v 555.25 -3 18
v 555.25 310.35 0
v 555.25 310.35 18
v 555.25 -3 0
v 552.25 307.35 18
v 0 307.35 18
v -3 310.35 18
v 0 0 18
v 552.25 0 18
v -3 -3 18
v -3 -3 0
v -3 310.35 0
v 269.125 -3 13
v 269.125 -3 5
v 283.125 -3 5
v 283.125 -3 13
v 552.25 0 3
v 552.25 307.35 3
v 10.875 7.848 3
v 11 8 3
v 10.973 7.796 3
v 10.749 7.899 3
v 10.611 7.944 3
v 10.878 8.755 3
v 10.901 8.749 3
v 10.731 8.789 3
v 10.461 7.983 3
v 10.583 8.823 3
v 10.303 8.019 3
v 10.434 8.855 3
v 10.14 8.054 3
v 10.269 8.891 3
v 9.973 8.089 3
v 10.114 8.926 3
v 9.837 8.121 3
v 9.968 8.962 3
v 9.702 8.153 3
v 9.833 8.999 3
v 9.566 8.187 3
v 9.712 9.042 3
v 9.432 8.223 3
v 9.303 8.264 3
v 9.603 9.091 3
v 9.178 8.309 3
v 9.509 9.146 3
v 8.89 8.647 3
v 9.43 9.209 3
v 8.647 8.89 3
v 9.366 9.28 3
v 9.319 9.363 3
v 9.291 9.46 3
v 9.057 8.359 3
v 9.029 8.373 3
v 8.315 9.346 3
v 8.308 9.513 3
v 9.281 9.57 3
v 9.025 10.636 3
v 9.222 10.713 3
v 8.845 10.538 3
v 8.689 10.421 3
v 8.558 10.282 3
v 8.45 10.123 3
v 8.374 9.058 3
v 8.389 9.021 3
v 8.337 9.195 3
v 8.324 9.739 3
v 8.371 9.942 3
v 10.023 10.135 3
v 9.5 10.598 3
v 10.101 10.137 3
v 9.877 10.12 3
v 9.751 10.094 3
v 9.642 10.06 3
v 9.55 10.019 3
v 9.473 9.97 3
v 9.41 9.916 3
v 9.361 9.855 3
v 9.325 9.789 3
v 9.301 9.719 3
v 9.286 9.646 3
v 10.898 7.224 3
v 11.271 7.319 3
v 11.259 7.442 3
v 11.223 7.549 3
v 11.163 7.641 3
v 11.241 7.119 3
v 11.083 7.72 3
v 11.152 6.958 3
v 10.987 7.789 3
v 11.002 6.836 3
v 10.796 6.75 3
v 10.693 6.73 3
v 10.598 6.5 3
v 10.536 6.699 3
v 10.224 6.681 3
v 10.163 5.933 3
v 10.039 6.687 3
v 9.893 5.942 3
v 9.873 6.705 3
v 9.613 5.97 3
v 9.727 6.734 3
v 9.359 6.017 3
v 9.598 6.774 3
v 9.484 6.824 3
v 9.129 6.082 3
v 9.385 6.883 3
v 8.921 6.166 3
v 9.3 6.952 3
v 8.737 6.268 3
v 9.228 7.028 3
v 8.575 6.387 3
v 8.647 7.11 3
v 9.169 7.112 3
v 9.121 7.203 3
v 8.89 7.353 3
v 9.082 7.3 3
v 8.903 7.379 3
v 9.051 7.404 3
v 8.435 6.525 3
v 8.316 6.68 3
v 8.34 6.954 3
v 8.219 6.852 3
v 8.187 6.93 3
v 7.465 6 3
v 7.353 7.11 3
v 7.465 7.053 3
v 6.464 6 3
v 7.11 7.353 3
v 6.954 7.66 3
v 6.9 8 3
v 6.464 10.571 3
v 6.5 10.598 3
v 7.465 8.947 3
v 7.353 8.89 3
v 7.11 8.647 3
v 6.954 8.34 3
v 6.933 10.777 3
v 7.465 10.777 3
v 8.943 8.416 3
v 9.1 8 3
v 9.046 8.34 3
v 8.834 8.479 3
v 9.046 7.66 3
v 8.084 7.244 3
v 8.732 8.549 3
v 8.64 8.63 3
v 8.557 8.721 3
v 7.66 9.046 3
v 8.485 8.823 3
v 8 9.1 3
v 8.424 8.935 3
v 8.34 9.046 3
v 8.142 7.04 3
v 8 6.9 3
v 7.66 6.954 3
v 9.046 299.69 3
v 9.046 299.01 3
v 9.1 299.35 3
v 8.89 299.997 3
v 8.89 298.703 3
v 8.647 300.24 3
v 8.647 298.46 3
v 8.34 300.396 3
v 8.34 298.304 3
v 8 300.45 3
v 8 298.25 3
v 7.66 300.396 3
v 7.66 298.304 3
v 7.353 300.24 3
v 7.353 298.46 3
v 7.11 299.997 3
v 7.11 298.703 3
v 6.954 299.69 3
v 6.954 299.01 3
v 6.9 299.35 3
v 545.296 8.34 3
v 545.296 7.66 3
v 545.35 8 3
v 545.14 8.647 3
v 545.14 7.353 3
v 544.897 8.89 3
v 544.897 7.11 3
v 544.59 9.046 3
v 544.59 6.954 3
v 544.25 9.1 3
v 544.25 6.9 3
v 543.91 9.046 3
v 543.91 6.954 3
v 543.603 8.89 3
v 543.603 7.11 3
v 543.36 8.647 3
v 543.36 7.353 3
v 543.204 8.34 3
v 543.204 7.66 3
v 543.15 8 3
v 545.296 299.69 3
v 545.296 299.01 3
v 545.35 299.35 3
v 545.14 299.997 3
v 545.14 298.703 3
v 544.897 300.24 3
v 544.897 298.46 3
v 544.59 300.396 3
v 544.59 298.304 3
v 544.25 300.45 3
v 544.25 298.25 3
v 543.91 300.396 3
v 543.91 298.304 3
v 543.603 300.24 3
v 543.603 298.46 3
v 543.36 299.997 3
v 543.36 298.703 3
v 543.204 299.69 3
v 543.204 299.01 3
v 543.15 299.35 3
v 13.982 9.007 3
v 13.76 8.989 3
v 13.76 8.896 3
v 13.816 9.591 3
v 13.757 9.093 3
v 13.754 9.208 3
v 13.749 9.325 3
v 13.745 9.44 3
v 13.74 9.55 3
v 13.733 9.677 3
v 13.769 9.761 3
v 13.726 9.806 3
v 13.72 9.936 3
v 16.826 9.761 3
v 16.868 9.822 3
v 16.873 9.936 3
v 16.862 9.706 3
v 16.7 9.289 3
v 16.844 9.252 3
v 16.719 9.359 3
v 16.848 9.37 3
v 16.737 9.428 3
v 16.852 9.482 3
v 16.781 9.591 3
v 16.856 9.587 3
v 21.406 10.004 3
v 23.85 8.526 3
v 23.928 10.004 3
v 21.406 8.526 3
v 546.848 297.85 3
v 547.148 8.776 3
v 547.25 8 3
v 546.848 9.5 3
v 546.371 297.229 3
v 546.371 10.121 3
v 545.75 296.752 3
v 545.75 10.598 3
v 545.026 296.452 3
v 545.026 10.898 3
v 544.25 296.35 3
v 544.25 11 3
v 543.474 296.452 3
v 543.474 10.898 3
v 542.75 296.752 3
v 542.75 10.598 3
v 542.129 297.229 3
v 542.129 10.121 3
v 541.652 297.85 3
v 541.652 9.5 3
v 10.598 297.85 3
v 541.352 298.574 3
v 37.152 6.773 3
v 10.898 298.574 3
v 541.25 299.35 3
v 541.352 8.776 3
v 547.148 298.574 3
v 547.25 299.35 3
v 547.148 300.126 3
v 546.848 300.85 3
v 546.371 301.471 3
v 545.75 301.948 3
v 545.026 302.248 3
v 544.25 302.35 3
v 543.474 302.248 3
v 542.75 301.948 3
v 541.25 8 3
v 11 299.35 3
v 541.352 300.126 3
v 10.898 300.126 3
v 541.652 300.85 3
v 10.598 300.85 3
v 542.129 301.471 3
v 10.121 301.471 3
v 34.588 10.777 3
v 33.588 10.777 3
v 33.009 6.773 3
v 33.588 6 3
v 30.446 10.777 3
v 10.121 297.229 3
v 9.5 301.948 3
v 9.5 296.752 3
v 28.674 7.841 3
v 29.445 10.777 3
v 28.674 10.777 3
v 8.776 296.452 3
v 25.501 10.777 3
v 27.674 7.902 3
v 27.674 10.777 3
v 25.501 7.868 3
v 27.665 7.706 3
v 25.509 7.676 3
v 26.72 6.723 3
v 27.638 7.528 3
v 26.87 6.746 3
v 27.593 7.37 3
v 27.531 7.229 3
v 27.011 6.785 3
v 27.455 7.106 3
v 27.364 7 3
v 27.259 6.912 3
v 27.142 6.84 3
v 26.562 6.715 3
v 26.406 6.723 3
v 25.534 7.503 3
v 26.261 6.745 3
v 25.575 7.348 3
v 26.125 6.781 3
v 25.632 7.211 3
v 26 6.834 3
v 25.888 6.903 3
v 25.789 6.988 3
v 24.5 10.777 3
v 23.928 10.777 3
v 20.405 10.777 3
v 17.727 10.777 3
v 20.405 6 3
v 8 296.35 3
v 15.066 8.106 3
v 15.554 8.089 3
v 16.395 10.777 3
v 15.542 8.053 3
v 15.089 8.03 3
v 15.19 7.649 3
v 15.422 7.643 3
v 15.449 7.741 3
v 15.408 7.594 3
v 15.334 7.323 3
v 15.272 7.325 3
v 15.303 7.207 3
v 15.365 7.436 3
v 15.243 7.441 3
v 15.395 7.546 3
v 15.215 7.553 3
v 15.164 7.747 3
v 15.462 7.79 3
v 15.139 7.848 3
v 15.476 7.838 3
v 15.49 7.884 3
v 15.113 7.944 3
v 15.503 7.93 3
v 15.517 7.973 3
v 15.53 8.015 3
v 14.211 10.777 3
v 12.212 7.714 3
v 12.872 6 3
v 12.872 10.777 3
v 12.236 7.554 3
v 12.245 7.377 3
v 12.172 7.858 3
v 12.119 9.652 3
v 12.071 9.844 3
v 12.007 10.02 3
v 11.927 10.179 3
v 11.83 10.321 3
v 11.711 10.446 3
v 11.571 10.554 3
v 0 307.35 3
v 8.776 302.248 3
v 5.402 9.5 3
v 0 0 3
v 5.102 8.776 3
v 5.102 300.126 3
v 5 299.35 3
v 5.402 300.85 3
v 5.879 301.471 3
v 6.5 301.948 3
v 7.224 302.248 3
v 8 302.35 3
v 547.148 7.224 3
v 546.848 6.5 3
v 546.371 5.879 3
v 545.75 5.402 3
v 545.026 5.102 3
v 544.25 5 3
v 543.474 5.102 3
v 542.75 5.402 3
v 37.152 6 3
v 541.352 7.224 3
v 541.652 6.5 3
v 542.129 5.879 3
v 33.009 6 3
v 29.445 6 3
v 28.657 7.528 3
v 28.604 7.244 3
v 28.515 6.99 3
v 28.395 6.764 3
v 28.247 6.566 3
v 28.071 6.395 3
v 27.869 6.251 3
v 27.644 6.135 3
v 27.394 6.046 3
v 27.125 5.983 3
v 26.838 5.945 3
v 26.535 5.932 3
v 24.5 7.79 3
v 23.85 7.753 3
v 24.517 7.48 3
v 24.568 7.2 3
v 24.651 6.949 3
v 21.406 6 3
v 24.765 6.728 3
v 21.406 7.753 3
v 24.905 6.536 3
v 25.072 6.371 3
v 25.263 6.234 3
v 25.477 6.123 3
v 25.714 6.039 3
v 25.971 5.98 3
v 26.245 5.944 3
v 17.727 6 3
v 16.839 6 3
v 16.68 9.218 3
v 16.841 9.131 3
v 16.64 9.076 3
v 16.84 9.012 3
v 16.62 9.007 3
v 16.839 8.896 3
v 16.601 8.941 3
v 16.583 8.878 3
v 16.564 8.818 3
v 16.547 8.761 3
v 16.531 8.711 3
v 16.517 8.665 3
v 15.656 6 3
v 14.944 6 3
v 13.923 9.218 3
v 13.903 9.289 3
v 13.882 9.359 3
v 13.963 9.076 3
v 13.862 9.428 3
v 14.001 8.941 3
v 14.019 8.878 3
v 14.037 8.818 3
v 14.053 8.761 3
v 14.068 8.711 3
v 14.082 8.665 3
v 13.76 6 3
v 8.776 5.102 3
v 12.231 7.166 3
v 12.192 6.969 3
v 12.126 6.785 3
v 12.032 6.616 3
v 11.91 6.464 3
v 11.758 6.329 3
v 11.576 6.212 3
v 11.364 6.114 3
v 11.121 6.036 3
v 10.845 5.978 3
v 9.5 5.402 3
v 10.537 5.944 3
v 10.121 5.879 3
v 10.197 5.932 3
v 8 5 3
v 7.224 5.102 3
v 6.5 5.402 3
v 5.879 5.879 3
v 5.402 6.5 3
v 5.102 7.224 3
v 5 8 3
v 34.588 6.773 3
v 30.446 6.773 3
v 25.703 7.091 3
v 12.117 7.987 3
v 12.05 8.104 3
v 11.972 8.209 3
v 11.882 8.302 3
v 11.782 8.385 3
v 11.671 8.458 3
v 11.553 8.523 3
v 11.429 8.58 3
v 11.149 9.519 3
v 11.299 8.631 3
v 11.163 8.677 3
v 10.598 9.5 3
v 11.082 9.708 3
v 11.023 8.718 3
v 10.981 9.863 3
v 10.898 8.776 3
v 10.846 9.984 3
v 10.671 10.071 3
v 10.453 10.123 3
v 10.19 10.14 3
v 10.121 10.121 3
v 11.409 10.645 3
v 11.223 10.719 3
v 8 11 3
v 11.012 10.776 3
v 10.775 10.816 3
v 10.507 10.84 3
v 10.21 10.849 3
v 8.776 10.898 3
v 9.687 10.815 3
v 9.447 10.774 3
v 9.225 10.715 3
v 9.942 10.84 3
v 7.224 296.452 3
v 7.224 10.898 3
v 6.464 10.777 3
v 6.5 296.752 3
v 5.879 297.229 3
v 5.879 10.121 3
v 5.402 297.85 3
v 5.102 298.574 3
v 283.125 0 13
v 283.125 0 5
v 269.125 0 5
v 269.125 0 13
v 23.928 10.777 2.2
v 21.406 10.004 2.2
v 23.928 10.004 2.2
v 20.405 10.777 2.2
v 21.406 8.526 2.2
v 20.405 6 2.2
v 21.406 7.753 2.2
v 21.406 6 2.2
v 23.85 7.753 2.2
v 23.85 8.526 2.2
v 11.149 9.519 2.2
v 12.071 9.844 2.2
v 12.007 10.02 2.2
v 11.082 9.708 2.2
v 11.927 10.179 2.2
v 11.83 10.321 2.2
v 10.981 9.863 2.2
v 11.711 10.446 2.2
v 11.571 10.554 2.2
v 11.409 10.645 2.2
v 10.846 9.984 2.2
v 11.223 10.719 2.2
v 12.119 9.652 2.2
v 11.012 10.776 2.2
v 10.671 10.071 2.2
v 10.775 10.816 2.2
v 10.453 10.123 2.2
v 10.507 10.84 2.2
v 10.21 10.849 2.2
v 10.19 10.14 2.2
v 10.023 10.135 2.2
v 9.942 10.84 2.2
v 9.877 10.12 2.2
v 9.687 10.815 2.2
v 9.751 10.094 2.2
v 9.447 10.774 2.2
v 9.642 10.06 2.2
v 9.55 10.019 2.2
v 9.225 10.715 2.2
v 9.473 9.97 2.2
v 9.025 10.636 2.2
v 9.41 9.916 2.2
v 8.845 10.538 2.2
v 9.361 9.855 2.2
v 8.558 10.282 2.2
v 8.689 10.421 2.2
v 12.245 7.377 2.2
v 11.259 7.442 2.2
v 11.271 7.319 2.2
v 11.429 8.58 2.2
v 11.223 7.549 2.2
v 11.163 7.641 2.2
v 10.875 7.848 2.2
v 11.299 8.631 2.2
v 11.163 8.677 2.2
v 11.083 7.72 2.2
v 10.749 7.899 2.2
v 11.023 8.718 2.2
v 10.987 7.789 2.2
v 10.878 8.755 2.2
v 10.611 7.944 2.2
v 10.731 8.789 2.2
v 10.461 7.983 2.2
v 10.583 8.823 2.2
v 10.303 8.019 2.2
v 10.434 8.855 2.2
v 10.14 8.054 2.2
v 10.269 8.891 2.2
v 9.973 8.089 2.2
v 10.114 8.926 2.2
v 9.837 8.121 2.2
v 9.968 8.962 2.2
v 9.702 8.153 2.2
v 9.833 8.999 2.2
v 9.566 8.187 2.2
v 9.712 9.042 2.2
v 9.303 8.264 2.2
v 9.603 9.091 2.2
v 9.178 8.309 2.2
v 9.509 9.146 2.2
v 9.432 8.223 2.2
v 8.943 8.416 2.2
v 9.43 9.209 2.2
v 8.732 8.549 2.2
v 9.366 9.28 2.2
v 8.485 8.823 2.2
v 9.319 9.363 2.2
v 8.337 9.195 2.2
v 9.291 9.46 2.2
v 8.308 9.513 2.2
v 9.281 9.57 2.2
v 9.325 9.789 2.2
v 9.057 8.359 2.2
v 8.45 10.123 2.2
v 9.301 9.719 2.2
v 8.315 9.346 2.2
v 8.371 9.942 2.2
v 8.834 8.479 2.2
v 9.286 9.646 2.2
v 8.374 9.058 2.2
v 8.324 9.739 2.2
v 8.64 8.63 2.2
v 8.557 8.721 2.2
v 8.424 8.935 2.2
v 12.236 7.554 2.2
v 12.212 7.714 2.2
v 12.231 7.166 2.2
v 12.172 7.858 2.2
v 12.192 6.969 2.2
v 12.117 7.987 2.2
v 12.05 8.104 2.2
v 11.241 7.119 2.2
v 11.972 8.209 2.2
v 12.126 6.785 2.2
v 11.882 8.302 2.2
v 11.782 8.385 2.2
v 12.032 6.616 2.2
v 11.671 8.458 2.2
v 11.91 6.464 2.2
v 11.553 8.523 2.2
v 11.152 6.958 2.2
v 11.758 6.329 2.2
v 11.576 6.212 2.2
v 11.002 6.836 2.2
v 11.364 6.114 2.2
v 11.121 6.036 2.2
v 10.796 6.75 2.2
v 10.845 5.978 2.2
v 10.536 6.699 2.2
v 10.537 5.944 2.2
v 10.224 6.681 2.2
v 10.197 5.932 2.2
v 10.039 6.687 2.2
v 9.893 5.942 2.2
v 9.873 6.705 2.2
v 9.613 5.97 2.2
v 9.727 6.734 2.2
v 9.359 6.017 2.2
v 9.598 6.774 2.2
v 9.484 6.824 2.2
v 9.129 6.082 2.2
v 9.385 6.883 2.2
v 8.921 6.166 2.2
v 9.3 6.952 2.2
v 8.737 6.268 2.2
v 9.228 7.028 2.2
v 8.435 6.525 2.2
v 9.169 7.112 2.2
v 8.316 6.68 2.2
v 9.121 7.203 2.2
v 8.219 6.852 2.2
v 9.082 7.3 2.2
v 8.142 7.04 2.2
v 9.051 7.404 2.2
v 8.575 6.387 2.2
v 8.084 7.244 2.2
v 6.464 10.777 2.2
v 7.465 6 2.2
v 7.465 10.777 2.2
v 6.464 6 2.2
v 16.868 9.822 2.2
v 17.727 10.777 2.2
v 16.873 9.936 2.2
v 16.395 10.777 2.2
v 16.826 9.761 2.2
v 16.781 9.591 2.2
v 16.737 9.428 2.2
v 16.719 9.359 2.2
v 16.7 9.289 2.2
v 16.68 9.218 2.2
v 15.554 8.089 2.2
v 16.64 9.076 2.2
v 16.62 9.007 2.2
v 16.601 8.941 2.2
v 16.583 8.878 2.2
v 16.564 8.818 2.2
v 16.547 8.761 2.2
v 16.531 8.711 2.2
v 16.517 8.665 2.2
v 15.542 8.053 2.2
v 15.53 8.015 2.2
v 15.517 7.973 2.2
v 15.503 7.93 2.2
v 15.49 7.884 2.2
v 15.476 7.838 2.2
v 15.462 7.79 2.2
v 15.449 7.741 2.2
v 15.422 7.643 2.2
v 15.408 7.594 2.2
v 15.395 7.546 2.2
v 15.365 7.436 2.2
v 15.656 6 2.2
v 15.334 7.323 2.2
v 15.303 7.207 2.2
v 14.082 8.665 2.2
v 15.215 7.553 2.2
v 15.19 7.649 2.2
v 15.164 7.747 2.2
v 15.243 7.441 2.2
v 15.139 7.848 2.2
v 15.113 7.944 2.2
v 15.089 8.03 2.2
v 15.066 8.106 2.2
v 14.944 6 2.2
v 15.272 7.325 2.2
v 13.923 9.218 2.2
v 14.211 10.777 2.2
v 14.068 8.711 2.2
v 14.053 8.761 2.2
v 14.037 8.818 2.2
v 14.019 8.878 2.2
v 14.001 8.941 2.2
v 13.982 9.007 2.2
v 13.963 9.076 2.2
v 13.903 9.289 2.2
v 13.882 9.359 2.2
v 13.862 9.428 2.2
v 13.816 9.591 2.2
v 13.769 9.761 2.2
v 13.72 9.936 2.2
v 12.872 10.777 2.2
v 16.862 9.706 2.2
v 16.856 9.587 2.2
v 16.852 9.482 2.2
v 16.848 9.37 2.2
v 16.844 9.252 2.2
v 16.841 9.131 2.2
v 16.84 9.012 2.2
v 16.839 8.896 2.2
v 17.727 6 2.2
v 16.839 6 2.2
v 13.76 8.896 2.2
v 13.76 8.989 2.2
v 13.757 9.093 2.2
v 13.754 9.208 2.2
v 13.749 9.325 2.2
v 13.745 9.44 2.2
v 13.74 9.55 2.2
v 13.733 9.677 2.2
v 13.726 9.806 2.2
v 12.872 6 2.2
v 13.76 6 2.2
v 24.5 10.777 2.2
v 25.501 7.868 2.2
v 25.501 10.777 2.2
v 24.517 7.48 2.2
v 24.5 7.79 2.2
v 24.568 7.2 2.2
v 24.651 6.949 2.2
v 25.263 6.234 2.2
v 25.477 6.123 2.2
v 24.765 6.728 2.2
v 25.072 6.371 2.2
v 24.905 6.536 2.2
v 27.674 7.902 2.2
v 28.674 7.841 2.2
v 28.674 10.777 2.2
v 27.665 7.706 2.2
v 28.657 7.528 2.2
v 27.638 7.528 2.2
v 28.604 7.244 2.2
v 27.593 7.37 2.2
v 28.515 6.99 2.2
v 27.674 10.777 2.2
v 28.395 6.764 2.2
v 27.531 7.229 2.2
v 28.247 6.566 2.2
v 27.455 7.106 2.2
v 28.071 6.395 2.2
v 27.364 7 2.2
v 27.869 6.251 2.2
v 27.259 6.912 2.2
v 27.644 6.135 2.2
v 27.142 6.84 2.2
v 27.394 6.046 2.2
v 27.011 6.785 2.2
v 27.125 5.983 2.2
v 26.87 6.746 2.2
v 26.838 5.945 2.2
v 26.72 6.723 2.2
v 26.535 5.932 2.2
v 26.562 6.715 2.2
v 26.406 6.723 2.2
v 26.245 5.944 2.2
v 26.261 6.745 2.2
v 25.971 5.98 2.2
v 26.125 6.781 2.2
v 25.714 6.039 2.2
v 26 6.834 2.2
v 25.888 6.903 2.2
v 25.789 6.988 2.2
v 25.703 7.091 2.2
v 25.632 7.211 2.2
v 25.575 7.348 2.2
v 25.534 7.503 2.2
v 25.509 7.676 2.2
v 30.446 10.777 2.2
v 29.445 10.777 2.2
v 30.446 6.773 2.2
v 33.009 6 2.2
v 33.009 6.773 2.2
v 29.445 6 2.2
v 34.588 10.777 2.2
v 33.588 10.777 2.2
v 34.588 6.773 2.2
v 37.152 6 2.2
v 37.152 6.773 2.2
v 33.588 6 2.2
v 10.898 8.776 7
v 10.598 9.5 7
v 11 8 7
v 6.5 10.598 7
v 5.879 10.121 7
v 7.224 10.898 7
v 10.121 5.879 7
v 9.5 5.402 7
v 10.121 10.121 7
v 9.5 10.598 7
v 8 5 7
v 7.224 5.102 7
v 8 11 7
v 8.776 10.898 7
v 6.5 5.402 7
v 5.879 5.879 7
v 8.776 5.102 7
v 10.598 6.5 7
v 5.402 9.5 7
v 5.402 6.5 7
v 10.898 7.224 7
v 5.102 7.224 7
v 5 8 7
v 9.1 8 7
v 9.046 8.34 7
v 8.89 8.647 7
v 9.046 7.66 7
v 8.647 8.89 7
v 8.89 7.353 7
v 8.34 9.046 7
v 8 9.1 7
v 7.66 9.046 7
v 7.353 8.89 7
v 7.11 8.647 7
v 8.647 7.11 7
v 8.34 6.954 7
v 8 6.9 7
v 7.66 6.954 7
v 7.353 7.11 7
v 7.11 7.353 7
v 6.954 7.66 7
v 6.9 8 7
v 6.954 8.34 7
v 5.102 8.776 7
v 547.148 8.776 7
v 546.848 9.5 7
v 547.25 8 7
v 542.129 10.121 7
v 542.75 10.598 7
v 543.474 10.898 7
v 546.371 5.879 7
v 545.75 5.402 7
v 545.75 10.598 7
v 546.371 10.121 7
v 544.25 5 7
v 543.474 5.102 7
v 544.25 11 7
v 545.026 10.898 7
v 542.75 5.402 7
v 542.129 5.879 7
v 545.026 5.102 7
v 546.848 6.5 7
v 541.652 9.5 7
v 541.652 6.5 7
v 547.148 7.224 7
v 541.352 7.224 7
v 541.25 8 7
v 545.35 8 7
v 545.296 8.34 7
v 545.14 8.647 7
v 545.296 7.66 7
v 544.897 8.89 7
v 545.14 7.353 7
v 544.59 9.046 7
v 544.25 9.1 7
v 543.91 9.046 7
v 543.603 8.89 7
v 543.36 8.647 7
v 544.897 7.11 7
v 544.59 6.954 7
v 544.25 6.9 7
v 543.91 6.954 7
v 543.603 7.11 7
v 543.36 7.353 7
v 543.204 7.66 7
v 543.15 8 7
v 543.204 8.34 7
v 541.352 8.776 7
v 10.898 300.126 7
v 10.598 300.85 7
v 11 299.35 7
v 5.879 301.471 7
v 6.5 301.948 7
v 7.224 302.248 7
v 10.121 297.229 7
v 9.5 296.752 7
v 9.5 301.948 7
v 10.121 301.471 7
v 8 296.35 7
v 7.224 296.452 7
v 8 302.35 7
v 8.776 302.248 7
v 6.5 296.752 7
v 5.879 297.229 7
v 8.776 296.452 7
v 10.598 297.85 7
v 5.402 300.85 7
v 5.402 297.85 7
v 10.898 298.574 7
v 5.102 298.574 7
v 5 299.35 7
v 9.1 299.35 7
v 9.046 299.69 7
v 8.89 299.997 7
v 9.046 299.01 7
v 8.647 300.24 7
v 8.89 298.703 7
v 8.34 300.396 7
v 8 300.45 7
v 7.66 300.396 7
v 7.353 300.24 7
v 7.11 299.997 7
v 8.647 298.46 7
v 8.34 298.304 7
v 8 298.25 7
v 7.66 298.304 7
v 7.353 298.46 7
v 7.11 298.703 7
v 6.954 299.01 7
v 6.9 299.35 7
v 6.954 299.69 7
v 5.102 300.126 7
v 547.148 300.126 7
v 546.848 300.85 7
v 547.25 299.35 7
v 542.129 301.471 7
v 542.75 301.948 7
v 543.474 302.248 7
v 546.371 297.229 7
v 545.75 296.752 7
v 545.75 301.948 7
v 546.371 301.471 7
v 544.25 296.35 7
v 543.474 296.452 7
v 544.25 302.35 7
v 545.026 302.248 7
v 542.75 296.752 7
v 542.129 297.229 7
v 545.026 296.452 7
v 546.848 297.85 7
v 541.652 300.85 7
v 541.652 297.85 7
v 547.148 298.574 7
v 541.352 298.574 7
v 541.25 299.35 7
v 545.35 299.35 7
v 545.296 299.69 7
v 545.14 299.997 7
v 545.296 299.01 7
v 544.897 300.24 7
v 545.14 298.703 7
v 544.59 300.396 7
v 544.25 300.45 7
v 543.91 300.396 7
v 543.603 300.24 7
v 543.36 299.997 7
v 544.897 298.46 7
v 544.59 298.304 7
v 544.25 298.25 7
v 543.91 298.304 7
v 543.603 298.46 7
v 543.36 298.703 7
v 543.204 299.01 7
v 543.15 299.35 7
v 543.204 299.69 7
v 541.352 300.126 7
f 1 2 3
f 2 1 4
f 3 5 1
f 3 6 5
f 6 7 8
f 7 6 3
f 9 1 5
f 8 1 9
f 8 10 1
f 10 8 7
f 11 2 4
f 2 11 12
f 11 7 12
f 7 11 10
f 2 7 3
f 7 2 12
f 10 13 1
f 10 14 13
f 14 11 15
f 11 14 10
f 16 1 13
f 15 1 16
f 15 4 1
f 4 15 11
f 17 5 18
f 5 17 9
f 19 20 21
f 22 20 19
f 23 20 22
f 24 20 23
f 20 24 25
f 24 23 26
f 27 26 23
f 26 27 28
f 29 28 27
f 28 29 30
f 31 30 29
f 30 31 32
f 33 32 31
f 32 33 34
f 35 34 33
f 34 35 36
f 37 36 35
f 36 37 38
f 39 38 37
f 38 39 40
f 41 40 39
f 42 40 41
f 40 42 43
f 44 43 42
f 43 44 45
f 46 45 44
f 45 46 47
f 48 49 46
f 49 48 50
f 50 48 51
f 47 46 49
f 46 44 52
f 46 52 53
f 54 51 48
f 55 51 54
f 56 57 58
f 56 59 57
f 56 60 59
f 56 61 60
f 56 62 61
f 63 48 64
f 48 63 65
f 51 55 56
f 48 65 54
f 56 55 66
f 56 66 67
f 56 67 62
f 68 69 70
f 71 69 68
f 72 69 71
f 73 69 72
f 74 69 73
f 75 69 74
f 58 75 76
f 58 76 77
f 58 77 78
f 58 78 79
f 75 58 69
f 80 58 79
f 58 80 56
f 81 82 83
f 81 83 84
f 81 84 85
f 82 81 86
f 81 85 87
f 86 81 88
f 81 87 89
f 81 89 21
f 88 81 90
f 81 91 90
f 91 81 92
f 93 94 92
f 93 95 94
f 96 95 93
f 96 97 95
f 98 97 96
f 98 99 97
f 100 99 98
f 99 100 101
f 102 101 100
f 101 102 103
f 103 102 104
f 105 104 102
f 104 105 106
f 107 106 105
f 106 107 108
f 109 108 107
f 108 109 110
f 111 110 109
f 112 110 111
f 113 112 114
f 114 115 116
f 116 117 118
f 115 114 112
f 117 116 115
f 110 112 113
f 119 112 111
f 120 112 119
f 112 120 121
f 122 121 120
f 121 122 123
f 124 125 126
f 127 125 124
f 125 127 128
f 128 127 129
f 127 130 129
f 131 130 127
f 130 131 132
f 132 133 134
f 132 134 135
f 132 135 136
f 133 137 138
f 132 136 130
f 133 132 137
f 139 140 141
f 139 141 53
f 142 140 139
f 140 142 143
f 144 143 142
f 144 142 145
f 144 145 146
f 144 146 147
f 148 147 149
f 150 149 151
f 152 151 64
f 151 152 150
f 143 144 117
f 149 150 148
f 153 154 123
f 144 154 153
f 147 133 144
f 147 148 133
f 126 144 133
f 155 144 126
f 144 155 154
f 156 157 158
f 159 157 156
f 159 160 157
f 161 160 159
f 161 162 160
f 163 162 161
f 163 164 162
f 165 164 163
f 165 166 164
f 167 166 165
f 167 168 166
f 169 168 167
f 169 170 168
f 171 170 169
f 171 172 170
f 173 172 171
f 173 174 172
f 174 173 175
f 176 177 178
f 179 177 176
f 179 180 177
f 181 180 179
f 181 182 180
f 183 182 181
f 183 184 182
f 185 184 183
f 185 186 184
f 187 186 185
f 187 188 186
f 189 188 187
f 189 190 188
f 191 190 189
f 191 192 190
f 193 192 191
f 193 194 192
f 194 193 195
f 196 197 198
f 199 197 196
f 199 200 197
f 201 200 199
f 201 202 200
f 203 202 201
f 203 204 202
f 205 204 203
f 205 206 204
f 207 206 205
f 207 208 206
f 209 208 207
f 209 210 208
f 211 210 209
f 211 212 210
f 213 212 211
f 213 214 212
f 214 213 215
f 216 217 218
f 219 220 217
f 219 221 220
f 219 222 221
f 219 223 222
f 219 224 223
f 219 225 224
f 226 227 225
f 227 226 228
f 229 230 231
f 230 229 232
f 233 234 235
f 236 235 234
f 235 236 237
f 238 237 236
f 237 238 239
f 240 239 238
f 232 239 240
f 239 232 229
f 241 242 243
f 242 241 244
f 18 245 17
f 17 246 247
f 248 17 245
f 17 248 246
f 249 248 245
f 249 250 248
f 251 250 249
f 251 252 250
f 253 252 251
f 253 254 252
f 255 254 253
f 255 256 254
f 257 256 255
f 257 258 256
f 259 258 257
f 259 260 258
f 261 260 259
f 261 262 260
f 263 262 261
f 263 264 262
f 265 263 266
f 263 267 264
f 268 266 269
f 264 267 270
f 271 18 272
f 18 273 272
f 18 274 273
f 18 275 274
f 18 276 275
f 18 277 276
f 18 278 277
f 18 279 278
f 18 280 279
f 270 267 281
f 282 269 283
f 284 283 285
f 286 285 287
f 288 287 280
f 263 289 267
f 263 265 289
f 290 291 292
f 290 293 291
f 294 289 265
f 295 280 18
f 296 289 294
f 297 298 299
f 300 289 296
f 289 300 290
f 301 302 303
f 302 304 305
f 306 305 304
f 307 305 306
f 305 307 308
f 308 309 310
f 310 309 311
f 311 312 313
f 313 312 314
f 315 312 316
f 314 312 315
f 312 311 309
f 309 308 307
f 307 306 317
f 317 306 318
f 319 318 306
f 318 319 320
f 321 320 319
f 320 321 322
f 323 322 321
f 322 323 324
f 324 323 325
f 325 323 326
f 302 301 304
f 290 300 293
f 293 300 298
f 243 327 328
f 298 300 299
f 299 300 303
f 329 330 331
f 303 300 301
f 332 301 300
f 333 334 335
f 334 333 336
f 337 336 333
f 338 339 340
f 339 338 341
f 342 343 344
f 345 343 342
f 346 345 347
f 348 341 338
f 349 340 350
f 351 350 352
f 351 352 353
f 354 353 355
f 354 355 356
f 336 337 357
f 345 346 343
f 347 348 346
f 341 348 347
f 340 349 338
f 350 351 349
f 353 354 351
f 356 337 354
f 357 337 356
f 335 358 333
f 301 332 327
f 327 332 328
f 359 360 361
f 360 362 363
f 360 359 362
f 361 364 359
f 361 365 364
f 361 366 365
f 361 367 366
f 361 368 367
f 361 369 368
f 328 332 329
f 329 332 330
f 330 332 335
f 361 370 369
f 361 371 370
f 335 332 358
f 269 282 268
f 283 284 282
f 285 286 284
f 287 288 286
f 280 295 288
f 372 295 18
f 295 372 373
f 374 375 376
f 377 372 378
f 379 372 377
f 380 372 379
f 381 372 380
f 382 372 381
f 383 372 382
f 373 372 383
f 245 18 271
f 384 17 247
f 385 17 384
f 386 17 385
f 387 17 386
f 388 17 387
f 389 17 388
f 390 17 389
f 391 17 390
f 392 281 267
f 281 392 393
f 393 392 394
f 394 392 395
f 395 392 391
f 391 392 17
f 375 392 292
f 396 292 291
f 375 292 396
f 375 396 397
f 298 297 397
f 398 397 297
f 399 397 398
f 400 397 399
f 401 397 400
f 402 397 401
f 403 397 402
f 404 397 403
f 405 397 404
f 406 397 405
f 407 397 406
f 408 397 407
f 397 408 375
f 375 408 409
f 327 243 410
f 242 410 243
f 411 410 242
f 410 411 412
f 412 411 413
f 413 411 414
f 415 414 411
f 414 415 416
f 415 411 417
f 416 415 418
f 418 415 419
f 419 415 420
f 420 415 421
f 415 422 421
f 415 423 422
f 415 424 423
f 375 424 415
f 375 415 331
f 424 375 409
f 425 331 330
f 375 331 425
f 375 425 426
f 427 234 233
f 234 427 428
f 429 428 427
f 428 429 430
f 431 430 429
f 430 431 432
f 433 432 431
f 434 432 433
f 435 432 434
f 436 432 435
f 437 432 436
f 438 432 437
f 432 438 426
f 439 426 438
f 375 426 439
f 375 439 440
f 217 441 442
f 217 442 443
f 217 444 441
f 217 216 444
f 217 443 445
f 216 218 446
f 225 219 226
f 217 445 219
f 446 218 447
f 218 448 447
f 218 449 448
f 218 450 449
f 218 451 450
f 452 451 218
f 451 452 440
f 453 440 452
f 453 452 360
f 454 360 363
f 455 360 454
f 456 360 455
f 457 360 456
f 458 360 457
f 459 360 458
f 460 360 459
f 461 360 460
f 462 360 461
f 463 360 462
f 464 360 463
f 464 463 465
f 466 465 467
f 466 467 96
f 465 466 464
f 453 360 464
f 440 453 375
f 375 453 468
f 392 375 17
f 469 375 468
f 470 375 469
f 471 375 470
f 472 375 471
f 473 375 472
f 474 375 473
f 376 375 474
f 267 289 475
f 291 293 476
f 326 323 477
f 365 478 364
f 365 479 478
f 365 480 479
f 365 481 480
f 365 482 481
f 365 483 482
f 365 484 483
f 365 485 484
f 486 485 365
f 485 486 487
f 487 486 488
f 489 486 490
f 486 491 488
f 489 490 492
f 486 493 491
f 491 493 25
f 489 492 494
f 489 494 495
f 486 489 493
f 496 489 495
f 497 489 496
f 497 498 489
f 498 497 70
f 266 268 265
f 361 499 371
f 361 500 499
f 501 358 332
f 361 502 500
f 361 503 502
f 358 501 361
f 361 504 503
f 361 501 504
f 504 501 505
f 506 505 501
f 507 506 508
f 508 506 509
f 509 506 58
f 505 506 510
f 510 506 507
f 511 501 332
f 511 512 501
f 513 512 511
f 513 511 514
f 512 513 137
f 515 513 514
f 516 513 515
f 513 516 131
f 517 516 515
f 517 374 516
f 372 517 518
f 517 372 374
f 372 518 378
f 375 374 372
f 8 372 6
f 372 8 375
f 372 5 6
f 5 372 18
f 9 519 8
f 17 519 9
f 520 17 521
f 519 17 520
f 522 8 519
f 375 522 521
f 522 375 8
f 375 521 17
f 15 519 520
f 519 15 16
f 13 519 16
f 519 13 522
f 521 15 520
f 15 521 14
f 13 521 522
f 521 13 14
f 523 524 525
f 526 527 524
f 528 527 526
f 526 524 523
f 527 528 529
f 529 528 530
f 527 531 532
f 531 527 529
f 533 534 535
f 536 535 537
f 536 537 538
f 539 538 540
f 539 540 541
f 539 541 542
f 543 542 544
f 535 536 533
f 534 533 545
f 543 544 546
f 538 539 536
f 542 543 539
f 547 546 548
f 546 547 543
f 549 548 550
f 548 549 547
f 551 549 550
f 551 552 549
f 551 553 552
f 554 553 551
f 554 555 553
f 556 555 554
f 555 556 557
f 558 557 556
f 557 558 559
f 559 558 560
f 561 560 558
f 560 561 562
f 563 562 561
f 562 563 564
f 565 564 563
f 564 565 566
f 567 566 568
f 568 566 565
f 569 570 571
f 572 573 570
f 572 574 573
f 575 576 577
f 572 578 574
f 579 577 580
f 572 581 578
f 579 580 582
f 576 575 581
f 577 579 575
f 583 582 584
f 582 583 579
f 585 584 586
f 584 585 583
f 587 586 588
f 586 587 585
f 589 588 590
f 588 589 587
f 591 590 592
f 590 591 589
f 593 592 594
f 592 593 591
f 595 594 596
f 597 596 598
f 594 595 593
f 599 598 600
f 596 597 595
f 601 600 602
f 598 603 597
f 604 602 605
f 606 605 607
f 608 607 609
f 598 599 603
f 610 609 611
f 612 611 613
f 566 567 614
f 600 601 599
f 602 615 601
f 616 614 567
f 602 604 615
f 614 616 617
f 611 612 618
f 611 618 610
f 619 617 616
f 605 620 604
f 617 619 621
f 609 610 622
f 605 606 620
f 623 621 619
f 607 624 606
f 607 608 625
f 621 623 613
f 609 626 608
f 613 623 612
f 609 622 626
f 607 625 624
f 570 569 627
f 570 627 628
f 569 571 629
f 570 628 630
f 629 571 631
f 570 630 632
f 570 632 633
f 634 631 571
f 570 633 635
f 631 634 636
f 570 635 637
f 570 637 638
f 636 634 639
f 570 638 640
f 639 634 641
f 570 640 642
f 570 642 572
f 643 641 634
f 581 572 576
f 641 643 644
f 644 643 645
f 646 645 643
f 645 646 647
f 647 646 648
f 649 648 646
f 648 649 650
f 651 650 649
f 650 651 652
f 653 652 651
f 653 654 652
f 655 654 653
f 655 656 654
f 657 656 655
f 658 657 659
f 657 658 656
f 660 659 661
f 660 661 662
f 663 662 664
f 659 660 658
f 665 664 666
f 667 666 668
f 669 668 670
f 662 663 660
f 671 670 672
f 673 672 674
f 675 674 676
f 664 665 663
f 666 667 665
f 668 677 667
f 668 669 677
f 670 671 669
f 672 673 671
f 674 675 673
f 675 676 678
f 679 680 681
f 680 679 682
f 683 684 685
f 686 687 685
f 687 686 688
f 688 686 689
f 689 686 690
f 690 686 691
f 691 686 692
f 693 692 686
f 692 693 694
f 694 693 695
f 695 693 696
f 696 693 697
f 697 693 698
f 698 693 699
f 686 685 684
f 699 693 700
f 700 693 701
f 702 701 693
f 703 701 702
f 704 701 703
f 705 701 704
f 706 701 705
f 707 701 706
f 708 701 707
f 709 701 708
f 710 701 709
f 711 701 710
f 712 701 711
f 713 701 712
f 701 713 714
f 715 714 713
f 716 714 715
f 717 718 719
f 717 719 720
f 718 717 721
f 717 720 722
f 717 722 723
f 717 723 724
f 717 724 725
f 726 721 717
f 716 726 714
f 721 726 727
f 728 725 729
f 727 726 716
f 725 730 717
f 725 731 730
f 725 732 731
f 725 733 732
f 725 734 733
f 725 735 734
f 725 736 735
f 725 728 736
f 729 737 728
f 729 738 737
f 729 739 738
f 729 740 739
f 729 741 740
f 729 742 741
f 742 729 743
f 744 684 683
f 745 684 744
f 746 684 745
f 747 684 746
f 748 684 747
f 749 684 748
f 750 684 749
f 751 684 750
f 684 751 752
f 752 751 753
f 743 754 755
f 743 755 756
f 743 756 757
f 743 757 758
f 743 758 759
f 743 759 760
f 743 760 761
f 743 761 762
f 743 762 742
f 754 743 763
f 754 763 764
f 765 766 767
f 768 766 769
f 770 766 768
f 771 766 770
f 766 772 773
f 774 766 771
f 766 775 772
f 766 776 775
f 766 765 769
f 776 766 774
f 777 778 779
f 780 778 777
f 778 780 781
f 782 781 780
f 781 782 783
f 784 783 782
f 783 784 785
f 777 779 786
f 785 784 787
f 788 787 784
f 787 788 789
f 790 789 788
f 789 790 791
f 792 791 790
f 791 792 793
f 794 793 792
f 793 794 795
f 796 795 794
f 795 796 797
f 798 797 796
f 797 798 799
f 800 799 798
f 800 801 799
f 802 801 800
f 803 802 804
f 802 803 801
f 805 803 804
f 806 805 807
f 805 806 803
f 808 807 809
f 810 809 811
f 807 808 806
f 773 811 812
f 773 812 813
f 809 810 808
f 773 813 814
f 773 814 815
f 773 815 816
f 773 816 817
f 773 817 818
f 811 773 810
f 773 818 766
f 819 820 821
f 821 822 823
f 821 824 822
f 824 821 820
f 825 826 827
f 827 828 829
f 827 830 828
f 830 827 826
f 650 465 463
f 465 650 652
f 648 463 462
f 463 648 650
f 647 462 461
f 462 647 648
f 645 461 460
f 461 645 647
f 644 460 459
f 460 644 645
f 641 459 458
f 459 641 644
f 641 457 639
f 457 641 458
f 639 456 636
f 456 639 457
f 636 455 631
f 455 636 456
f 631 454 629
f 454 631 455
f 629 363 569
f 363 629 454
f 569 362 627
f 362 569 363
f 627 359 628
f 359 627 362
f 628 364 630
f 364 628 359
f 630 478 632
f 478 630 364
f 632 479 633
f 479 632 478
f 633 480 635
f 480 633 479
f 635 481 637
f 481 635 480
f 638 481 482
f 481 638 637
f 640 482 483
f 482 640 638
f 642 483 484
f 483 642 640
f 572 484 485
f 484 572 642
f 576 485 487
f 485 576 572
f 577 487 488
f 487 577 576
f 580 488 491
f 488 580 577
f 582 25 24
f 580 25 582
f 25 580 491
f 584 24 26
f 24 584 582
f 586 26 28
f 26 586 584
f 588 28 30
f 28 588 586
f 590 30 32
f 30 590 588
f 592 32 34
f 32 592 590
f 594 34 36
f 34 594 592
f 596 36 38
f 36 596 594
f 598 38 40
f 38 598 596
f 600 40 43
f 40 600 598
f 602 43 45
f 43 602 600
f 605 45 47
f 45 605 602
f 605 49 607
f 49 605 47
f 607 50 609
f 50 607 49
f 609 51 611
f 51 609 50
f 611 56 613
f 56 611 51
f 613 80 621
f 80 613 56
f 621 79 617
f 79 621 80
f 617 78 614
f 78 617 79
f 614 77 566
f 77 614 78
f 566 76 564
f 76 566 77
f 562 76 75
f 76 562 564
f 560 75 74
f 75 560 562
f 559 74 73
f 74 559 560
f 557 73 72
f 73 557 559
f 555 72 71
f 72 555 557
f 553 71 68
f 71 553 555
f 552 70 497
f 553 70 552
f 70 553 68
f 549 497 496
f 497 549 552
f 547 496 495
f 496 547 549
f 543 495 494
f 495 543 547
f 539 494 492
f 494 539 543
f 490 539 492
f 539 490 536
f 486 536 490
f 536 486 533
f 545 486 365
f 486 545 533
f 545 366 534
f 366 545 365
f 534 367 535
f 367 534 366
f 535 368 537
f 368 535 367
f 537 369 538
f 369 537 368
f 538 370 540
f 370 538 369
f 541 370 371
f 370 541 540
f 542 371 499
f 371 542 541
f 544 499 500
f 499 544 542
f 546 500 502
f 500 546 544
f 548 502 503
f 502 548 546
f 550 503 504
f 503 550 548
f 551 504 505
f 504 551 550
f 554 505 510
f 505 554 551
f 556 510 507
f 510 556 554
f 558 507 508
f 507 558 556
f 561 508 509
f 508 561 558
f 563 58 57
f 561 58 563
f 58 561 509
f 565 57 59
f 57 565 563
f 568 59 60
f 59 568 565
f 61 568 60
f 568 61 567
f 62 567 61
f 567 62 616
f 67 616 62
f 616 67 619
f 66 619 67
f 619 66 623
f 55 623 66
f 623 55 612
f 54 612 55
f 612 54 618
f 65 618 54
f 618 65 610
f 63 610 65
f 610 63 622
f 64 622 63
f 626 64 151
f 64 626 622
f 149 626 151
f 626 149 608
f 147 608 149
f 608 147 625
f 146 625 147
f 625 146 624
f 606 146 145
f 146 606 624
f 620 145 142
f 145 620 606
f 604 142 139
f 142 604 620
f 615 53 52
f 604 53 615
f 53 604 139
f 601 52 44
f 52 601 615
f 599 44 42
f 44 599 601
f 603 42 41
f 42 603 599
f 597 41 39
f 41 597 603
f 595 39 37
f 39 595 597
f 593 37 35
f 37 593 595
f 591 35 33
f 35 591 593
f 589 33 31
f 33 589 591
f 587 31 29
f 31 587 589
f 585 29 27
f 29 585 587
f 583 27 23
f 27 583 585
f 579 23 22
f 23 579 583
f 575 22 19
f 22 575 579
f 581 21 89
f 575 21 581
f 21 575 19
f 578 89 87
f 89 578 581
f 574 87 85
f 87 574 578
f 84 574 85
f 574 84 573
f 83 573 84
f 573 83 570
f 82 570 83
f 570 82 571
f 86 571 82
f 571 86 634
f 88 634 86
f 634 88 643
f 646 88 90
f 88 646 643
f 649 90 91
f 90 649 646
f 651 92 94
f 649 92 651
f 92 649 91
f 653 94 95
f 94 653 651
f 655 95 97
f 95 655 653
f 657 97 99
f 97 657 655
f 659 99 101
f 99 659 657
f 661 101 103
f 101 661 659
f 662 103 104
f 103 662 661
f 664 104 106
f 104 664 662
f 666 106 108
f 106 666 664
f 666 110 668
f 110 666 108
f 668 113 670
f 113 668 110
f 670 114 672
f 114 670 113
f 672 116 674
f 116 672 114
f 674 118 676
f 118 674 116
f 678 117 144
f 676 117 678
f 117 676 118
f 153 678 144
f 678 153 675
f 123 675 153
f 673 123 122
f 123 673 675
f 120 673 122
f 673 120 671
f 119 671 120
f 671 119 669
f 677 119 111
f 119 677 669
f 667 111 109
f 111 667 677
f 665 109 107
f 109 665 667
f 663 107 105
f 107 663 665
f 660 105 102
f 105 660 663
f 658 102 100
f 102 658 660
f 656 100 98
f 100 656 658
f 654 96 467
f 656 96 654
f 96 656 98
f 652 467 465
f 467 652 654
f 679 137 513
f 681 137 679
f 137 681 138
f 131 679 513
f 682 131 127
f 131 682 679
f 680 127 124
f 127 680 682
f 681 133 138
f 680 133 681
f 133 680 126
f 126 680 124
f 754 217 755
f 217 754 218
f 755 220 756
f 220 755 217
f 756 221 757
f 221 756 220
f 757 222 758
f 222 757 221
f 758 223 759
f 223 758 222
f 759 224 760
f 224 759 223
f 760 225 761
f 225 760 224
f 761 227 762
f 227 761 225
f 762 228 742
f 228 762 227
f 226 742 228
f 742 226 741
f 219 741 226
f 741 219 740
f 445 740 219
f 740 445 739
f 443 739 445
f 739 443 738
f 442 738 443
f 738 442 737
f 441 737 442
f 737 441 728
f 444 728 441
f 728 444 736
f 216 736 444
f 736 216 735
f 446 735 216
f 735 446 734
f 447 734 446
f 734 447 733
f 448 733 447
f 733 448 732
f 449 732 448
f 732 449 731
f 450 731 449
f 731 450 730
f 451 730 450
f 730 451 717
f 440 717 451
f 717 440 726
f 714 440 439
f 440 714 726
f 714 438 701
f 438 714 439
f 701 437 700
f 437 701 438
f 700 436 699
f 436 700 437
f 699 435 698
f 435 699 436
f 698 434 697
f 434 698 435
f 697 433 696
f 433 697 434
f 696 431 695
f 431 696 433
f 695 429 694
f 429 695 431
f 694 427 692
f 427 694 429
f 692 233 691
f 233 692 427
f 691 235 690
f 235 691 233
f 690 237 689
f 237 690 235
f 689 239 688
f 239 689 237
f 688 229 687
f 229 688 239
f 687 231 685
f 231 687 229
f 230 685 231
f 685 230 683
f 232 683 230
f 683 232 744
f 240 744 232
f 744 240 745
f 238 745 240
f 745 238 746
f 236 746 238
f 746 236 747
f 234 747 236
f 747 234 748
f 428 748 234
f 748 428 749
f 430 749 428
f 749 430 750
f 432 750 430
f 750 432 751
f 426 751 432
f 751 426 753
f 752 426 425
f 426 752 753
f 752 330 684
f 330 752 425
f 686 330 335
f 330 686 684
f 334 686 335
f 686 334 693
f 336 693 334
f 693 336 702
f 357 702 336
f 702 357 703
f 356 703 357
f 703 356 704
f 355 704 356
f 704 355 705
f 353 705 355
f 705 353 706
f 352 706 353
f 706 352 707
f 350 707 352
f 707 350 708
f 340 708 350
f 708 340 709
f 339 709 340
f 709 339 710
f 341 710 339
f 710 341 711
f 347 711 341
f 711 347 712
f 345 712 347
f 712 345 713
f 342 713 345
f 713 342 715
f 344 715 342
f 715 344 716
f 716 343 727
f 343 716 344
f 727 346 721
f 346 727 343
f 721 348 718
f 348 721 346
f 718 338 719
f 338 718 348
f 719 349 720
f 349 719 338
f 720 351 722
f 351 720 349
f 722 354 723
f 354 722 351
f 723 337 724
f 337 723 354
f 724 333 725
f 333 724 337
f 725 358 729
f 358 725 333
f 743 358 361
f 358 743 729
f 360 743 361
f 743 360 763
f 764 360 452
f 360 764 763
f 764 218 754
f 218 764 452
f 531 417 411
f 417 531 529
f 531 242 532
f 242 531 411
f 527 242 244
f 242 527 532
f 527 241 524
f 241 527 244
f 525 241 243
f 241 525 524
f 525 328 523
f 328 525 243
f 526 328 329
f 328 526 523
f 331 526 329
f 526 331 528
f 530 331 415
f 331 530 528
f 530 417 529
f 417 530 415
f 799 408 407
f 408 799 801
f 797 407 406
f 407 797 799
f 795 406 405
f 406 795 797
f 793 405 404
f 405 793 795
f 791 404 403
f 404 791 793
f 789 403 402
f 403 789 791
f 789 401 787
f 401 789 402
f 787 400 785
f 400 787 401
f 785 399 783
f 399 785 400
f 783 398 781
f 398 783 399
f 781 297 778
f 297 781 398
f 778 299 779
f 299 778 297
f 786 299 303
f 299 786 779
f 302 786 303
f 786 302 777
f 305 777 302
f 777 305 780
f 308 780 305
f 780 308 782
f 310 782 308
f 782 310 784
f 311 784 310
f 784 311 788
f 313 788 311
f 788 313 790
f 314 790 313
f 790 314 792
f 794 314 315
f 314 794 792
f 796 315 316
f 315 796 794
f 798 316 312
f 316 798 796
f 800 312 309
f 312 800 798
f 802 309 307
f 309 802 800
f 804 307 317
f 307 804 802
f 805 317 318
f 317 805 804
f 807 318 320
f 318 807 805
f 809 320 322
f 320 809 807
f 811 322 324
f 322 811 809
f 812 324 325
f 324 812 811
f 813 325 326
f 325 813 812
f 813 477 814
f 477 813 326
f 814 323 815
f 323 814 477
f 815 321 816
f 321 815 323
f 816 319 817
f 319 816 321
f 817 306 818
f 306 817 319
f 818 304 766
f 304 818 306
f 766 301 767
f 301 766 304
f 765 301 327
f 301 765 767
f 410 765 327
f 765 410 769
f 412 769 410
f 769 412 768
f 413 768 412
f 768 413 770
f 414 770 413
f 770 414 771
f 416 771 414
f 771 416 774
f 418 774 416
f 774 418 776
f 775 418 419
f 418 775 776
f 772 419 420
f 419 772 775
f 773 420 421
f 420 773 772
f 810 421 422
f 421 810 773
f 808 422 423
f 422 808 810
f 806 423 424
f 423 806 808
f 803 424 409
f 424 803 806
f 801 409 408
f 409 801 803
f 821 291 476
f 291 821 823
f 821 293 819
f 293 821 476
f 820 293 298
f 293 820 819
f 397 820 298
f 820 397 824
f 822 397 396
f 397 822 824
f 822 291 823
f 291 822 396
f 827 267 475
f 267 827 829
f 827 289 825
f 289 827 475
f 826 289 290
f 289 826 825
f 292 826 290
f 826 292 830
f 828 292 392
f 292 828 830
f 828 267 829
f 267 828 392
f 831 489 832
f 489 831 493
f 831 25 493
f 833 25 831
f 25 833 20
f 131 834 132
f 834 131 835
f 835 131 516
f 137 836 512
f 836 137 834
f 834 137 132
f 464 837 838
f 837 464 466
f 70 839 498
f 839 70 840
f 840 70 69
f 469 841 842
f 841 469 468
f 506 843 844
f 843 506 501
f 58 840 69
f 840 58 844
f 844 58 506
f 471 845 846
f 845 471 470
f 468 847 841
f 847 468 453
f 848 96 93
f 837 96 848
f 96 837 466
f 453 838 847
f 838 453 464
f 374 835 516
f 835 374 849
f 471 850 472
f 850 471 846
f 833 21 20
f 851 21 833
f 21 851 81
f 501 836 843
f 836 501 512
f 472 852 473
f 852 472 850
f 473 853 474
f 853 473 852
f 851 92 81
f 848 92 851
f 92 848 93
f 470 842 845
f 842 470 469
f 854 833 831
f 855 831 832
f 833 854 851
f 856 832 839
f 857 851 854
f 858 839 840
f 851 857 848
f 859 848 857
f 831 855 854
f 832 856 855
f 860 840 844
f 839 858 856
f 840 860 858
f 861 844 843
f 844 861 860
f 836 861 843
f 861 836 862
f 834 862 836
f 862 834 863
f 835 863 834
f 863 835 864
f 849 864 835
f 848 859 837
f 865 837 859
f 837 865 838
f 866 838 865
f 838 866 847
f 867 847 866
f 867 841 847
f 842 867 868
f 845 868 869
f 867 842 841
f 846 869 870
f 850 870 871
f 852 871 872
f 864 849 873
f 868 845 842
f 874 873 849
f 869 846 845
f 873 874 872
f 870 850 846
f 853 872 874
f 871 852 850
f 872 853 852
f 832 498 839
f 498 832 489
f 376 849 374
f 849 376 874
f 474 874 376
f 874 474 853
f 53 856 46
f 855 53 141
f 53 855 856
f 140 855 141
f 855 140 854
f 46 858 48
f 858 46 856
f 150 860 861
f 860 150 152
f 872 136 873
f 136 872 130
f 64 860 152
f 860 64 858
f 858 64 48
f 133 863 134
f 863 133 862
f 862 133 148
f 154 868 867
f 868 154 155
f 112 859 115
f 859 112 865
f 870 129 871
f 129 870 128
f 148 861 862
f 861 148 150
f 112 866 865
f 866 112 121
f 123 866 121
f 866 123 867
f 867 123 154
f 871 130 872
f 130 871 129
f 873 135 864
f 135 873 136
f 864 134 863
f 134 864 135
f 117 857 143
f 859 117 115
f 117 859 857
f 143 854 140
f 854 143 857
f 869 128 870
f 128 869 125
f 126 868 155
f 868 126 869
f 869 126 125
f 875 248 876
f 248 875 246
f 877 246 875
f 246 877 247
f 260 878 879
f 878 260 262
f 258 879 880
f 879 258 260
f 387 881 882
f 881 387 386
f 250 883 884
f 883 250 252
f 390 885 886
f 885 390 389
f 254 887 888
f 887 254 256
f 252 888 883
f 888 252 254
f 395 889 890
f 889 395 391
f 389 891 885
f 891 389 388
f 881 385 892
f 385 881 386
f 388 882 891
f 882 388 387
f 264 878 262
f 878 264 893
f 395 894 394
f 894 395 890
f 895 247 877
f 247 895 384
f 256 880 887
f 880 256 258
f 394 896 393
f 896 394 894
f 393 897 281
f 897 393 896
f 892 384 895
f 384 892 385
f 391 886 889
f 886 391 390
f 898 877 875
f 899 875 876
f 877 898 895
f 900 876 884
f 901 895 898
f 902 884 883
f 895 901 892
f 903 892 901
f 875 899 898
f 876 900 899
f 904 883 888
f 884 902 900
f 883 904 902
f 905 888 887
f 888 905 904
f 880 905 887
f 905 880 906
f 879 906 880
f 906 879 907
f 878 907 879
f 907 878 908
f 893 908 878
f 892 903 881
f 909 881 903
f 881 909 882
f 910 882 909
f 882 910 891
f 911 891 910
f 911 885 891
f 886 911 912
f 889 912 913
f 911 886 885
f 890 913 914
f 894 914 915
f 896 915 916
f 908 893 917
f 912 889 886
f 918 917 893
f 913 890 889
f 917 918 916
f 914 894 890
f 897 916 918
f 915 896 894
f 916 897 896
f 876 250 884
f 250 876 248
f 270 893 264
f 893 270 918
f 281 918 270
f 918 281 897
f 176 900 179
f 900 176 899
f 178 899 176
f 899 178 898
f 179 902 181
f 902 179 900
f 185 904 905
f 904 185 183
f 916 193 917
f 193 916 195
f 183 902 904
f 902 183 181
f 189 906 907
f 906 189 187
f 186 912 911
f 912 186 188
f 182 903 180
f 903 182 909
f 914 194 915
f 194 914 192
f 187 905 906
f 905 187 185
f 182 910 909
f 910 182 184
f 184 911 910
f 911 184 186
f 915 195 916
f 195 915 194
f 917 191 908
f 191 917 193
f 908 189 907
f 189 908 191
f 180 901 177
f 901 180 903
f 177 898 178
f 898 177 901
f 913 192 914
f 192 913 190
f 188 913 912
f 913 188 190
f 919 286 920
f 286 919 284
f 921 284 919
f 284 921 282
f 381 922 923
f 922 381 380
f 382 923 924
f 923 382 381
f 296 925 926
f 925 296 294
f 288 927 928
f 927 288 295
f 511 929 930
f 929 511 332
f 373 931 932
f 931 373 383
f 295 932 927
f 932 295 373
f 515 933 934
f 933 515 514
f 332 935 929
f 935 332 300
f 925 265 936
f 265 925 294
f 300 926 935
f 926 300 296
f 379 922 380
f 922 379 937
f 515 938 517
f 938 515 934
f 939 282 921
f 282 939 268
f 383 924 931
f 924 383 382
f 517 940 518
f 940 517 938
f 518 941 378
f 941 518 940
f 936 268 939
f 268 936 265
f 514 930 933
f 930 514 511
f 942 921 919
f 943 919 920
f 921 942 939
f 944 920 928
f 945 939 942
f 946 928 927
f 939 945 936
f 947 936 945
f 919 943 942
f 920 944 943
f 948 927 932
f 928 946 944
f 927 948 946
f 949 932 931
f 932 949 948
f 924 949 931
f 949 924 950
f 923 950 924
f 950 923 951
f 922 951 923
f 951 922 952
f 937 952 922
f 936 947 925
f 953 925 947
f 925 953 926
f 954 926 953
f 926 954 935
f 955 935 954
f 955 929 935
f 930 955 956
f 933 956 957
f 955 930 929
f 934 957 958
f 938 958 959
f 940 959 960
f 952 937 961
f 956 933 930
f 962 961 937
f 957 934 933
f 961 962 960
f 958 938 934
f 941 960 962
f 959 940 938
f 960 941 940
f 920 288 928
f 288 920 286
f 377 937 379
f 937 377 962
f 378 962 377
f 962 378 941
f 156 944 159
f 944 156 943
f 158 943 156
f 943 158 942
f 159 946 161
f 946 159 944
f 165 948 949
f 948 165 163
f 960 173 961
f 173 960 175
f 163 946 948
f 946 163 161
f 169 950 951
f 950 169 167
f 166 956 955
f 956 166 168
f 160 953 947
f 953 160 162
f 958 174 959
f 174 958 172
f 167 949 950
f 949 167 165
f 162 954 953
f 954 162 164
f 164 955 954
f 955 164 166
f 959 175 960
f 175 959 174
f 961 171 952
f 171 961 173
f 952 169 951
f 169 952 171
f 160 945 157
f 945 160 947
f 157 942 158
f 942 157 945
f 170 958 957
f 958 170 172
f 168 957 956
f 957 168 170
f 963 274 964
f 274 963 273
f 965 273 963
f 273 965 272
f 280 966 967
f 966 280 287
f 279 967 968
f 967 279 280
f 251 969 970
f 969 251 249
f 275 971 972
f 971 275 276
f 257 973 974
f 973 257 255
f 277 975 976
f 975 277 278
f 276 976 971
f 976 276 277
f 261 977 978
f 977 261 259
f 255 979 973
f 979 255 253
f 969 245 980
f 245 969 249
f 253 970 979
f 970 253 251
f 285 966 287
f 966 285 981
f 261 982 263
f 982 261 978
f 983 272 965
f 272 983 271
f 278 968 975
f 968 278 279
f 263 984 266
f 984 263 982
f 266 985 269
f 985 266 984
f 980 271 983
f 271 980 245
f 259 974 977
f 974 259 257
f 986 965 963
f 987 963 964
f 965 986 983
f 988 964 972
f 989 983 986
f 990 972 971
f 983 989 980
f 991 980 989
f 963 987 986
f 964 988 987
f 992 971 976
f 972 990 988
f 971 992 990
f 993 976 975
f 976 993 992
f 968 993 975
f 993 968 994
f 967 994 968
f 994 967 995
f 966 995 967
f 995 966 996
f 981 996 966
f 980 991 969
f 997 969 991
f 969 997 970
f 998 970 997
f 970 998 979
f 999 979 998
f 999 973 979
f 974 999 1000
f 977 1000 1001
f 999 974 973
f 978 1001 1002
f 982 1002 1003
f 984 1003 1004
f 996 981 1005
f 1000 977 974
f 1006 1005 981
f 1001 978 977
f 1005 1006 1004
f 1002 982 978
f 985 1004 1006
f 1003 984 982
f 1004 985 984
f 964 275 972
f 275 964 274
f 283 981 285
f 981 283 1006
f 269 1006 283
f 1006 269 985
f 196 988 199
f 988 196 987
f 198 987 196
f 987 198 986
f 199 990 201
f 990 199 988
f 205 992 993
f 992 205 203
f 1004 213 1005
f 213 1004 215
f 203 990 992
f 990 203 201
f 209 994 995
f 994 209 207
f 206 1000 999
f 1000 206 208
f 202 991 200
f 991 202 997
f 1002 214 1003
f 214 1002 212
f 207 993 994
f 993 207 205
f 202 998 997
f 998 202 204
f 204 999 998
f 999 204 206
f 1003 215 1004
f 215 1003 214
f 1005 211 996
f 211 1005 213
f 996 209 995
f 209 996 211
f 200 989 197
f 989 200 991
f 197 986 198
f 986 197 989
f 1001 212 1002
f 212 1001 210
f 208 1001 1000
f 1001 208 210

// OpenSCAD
// ISM Full Size keyboard case — parametric OpenSCAD (original ISM design)
unit=19.05; rows=7; margin_x=18; margin_y=24; pcb_extra_x=40; pcb_units_x=25.0; pcb_extra_y=150;
wall=3; base_th=3; lip=1.2; usb_w=14; usb_h=8; mount_d=2.2; badge_depth=0.8;
pcb_w=margin_x*2+pcb_units_x*unit+pcb_extra_x; pcb_h=margin_y+rows*unit+pcb_extra_y;
case_w=pcb_w+2*wall; case_h=pcb_h+2*wall; case_z=18;
module switch_cutouts(){for(r=[0:5],c=[0:24])translate([margin_x+(c+0.5)*unit,margin_y+(r+0.5)*unit,-1])cube([14,14,wall+4],center=true);}
module bottom_shell(){difference(){translate([-wall,-wall,0])cube([case_w,case_h,case_z]);translate([0,0,base_th])cube([pcb_w,pcb_h,case_z]);translate([pcb_w/2-usb_w/2,-wall-1,base_th+2])cube([usb_w,wall+4,usb_h]);translate([6,6,base_th-badge_depth])linear_extrude(height=badge_depth+0.1)text("ISM FULL",size=5,font="Liberation Sans:style=Bold");}for(p=[[8,8],[pcb_w-8,8],[8,pcb_h-8],[pcb_w-8,pcb_h-8]])translate([p[0],p[1],base_th])difference(){cylinder(h=4,d=6,$fn=24);translate([0,0,-0.1])cylinder(h=5,d=mount_d,$fn=20);}}
module top_plate(){difference(){translate([-lip,-lip,0])cube([pcb_w+2*lip,pcb_h+2*lip,wall]);switch_cutouts();translate([margin_x,margin_y+6*unit+2,-1])cube([pcb_units_x*unit,pcb_extra_y-4,wall+2]);}}
module top_frame(){difference(){translate([-wall,-wall,0])cube([case_w,case_h,8]);translate([lip,lip,-1])cube([pcb_w-2*lip,pcb_h-2*lip,10]);translate([pcb_w/2-usb_w/2,-wall-1,2])cube([usb_w,wall+4,usb_h]);}}
bottom_shell();
